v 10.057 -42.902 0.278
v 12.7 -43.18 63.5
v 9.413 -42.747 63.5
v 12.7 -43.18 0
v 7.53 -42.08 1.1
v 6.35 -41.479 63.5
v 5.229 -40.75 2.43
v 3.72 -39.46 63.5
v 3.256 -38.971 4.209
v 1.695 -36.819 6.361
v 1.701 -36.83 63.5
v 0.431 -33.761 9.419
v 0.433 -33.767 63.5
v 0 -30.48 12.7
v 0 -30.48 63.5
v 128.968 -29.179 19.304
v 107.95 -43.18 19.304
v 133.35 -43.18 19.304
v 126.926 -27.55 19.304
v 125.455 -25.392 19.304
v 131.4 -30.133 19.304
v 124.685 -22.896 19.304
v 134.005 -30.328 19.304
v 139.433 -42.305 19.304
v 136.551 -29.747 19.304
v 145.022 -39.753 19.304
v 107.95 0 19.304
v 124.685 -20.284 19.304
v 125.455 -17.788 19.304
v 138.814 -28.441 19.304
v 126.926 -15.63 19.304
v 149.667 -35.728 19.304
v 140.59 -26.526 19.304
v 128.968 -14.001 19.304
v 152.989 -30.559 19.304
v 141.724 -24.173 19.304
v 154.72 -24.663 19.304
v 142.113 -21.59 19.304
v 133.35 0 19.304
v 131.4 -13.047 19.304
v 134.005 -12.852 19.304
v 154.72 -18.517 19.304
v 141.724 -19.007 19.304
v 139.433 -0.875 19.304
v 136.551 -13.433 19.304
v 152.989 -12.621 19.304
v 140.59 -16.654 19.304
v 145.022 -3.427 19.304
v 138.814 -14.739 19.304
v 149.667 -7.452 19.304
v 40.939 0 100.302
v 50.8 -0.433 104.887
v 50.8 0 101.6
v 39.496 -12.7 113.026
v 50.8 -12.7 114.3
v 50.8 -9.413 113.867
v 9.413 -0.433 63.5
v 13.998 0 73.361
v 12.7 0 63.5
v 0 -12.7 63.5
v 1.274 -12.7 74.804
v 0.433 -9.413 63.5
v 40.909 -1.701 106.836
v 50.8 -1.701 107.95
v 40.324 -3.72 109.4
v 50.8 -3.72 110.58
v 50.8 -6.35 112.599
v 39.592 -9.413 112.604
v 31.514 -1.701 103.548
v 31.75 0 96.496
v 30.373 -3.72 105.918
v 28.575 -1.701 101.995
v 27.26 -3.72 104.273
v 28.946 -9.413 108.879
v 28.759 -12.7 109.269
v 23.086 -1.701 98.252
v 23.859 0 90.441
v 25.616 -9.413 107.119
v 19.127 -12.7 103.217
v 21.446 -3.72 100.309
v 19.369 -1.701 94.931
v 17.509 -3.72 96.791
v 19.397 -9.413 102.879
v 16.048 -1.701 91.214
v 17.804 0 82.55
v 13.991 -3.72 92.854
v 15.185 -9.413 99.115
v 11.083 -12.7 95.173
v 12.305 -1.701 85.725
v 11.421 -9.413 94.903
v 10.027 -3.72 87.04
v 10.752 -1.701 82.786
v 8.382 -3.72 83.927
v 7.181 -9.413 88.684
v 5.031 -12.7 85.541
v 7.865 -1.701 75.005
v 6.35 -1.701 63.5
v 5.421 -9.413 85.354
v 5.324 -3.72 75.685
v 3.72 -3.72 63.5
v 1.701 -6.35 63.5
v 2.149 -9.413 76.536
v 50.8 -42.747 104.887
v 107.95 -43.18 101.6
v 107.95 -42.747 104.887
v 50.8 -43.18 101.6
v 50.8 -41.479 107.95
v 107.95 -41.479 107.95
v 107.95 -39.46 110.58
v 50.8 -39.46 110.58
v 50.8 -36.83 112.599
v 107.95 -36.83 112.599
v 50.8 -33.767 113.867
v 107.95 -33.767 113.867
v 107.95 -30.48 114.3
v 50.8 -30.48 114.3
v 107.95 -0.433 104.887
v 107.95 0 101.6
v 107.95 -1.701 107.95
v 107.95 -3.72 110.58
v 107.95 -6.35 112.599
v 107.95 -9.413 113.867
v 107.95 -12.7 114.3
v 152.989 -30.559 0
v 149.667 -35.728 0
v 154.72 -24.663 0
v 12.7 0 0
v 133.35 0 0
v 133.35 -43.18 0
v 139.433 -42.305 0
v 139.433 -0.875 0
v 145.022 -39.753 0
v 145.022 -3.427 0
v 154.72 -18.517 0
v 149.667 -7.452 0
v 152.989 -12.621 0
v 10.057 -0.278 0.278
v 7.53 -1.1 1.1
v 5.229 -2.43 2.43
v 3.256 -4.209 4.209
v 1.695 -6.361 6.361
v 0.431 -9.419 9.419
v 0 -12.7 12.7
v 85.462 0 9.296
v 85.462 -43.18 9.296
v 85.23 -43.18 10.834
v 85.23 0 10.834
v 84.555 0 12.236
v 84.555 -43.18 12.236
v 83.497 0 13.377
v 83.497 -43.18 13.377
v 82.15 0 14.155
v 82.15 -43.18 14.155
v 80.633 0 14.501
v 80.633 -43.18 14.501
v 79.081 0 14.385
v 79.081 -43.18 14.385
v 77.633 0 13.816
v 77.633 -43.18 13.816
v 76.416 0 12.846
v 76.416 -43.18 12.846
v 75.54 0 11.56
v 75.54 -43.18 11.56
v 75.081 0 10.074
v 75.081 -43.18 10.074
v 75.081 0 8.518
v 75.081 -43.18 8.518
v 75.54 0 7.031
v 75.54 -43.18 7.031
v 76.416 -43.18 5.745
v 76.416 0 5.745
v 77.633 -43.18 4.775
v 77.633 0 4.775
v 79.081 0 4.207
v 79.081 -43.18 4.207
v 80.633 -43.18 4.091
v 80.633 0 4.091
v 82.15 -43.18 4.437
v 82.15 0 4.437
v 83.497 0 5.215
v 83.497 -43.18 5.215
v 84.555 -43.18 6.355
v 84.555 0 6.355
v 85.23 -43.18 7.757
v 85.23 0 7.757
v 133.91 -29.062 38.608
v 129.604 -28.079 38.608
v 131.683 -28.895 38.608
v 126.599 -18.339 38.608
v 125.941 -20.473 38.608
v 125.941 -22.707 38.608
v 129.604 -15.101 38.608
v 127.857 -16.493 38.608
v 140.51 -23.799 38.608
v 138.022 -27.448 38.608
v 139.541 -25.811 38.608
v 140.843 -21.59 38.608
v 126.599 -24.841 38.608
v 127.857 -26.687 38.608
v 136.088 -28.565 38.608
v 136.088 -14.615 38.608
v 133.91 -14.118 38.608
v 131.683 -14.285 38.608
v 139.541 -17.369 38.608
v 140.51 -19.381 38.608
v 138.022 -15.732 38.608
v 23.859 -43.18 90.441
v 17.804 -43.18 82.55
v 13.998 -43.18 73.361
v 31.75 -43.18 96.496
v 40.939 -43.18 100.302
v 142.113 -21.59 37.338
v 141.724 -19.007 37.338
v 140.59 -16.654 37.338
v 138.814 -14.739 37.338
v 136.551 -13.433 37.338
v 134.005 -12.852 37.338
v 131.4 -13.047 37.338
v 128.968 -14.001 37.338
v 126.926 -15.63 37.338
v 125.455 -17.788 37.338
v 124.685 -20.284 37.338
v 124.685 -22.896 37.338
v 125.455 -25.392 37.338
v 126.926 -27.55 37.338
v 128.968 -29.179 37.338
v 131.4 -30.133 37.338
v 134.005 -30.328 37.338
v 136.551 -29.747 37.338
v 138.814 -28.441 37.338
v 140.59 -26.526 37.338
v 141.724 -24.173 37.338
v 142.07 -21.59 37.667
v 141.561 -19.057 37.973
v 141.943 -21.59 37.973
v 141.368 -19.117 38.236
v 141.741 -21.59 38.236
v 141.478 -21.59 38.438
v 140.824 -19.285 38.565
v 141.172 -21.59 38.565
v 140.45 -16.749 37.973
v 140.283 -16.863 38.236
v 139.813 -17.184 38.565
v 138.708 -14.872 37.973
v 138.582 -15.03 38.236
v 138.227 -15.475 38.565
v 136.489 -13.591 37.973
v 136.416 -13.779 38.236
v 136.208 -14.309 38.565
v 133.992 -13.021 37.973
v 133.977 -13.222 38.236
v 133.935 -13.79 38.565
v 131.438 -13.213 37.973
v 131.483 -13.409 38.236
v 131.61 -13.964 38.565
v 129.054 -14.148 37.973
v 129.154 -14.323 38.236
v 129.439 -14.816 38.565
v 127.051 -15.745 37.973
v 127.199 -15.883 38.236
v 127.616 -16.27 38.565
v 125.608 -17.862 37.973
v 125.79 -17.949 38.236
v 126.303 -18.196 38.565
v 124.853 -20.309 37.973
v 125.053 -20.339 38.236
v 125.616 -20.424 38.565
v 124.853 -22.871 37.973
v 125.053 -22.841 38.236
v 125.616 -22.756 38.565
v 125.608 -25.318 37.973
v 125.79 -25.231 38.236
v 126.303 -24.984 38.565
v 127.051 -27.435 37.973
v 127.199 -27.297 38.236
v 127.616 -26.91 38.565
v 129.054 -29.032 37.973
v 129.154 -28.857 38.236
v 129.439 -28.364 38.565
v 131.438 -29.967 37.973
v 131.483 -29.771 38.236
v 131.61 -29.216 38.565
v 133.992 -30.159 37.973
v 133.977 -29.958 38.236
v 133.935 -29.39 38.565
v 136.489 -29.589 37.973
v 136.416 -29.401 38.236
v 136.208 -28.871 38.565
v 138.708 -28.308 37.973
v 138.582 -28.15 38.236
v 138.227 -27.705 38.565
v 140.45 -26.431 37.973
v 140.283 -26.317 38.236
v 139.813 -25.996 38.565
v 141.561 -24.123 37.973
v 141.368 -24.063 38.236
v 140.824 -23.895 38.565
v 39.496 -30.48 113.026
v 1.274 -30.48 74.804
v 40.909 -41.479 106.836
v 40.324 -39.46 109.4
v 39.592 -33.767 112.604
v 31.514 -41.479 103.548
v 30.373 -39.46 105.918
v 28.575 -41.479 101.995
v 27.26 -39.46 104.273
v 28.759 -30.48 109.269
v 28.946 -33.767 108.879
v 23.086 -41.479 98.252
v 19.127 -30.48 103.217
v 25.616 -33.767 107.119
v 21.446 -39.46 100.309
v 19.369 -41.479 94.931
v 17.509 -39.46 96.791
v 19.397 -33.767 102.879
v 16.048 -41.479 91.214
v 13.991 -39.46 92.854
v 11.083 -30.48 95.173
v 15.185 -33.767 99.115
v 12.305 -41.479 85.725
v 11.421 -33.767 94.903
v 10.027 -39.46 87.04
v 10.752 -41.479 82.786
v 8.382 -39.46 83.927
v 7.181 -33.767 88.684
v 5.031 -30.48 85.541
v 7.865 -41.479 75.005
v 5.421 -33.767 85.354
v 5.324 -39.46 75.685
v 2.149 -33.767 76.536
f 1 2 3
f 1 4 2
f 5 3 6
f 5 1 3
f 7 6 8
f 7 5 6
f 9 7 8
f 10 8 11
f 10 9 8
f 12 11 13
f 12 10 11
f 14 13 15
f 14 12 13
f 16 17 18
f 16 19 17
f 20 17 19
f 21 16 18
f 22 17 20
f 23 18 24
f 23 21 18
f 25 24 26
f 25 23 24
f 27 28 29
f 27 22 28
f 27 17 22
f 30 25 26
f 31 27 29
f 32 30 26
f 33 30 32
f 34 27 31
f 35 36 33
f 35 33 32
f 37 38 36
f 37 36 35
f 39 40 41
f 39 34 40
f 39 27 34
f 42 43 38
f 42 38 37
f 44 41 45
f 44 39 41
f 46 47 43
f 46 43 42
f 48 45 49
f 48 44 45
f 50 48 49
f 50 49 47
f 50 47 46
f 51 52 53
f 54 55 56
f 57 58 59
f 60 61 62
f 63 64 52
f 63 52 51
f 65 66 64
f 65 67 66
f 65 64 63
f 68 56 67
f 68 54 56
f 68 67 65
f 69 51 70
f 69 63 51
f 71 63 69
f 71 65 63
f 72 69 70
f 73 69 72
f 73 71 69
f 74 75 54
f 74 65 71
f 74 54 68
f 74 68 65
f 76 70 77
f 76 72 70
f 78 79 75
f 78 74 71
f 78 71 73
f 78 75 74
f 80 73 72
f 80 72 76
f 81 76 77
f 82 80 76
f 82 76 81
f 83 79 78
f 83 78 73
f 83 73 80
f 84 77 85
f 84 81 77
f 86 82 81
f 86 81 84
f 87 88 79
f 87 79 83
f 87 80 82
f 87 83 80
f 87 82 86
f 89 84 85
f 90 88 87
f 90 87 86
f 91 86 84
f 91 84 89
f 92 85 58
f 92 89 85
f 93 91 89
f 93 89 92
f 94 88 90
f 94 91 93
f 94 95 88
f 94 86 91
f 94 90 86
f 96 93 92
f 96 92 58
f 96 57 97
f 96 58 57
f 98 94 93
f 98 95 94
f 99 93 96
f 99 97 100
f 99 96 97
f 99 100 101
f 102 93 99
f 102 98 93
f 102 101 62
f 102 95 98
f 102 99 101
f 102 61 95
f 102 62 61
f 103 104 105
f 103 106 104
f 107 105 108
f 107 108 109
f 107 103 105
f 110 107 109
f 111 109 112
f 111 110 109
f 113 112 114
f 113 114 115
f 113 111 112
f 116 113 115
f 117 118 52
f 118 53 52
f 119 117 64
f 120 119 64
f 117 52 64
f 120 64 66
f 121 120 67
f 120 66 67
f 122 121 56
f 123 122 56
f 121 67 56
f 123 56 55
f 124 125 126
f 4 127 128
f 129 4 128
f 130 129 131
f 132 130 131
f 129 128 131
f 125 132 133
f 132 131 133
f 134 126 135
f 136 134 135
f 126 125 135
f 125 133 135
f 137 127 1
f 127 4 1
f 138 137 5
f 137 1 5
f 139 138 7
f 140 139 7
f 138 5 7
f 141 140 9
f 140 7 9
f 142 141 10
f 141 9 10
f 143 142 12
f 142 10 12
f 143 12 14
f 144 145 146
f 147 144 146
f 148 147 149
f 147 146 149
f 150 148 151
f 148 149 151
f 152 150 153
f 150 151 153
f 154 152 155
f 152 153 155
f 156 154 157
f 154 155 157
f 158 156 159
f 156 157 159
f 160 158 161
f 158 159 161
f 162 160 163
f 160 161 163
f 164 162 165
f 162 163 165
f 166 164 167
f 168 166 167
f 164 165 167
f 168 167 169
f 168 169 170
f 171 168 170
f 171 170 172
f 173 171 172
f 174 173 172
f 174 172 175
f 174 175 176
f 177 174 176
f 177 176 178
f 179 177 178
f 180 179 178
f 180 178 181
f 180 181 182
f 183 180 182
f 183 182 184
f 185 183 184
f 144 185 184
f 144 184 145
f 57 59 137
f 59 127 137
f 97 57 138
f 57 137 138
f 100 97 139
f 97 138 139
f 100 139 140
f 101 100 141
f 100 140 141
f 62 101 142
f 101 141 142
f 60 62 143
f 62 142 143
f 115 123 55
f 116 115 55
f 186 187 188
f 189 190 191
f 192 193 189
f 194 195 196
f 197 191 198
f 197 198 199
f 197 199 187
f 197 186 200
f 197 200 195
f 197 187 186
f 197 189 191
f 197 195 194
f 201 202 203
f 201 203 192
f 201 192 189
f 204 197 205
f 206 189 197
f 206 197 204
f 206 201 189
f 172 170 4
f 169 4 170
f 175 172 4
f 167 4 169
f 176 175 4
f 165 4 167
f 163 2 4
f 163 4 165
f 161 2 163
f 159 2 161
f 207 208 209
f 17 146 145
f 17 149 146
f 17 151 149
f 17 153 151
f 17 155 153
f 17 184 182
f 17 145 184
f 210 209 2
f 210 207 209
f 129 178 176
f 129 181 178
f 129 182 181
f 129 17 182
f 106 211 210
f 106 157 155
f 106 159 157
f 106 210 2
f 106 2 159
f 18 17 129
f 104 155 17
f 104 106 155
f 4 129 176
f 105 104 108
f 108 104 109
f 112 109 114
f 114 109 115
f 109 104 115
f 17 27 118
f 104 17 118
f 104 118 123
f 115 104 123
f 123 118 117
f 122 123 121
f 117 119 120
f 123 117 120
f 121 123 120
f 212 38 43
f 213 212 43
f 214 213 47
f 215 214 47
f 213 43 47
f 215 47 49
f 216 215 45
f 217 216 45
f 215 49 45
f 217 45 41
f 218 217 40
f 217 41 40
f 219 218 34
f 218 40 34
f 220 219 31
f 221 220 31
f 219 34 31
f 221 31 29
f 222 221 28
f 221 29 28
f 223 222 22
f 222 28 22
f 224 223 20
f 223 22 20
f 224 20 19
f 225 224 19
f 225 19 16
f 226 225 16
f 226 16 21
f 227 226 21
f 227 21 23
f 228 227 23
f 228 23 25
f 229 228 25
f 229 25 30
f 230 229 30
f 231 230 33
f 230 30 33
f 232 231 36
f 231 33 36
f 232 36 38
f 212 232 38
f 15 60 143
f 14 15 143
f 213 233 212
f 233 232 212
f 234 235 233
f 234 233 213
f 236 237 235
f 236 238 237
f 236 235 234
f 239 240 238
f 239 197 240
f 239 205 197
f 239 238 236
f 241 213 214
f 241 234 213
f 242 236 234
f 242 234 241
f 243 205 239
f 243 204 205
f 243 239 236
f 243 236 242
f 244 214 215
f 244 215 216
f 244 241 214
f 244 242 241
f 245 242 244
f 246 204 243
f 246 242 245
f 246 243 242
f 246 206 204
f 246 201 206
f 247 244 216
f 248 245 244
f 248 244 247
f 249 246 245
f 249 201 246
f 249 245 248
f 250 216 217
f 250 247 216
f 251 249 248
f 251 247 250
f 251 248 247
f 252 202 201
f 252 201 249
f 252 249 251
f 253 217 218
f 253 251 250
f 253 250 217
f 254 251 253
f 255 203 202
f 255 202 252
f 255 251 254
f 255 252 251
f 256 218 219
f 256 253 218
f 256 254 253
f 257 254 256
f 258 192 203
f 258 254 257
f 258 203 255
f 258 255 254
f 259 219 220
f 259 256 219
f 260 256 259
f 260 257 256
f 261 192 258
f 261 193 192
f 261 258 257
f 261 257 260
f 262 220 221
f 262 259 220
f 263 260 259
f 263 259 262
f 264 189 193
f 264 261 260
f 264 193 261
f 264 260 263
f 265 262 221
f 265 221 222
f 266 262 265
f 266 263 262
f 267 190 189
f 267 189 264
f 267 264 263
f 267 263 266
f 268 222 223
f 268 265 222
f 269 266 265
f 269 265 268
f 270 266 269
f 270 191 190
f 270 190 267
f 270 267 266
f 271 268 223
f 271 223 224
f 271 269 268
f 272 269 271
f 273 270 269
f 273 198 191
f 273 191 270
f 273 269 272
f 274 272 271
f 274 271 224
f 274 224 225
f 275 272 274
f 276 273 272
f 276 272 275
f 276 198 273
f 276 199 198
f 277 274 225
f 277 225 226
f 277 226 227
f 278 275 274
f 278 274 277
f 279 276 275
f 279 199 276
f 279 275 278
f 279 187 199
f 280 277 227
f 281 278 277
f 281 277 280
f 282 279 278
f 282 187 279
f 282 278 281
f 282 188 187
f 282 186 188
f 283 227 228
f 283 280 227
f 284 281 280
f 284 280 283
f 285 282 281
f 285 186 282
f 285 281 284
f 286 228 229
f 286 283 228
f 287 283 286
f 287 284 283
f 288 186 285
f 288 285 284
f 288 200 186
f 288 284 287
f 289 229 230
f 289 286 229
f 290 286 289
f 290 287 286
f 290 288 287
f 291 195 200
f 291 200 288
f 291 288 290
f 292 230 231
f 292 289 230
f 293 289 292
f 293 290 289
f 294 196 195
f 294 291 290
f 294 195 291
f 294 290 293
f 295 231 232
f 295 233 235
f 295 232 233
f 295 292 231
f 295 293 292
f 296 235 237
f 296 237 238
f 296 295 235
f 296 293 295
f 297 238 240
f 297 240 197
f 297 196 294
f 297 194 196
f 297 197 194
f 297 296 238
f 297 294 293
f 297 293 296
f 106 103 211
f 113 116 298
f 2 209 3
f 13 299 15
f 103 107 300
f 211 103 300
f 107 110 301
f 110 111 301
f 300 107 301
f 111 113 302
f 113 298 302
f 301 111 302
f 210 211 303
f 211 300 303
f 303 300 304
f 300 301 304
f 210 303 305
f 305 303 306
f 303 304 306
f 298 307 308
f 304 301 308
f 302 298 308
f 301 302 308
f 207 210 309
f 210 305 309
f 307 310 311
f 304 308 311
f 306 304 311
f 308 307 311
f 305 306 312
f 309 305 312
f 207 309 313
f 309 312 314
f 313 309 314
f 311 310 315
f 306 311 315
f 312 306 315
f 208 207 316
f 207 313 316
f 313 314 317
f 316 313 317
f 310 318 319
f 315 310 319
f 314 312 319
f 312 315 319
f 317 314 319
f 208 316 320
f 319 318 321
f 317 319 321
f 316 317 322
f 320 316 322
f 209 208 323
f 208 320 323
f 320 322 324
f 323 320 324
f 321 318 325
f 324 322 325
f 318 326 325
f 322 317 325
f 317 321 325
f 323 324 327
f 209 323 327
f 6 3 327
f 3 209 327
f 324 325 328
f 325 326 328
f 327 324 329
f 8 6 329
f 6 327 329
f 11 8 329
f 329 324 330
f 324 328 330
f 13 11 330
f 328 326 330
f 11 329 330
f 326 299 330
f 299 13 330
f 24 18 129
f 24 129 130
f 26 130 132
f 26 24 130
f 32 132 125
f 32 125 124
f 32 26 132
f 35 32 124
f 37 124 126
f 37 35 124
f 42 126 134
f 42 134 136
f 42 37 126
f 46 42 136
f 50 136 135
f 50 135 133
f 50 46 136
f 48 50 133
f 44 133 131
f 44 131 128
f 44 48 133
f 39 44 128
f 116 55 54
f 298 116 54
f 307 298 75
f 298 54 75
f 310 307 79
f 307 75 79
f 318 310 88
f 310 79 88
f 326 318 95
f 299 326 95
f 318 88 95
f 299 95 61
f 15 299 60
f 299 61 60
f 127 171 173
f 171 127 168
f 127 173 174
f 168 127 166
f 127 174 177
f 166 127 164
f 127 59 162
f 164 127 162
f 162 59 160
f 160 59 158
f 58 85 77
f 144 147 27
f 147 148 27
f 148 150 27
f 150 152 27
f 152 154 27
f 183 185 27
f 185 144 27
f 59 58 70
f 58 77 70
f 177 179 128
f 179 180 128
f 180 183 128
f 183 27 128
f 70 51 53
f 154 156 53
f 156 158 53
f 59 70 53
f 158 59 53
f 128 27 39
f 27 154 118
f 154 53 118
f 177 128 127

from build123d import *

# Parameters (mm, degrees)
F0_W     = 25.4
F0_H     = 19.304
F1_DEPTH = 43.18
F3_DEPTH = 19.304
F4_R     = 8.763
F5_DEPTH = 19.304
F6_R     = 1.27
F7_R     = 12.7
F8_R     = 5.2197
F9_DEPTH = 43.181


with BuildPart() as f1:
    # F0 (on Front) → F1 (new body)
    with BuildSketch(Plane.XZ):
        with BuildLine():
            Line((0, 63.5), (0, 0))
            Line((0, 0), (107.95, 0))
            Line((107.95, 0), (107.95, 19.304))
            Line((107.95, 19.304), (107.95, 114.3))
            Line((107.95, 114.3), (50.8, 114.3))
            ThreePointArc((50.8, 114.3), (14.878976, 99.421024), (0, 63.5))
        make_face()
        with Locations((120.65, 9.652)):
            Rectangle(F0_W, F0_H)
    extrude(amount=F1_DEPTH)

    # F2 (on face) → F3 (join)
    with BuildSketch(Plane.XY.offset(19.304)):
        with BuildLine():
            Line((133.35, 0), (133.35, -43.18))
            ThreePointArc((133.35, -43.18), (154.94, -21.59), (133.35, 0))
        make_face()
    extrude(amount=-F3_DEPTH)

    # F4 (on face) → F5 (join)
    with BuildSketch(Plane.XY.offset(19.304)):
        with Locations((133.35, -21.59)):
            Circle(F4_R)
    extrude(amount=F5_DEPTH)

    # F6
    f6_edges = [f1.edges().sort_by_distance(p)[0] for p in [
        (124.587, -21.59, 38.608),
    ]]
    fillet(f6_edges, radius=F6_R)

    # F7
    f7_edges = [f1.edges().sort_by_distance(p)[0] for p in [
        (50.8, -21.59, 114.3),
        (0, -21.59, 63.5),
        (14.878976, 0, 99.421024),
        (14.878976, -43.18, 99.421024),
        (0, -21.59, 0),
    ]]
    fillet(f7_edges, radius=F7_R)

    # F8 (on face) → F9 (cut, through all)
    with BuildSketch(Plane.XZ.offset(43.18)):
        with Locations((80.242619, 9.295693)):
            Circle(F8_R)
    extrude(amount=-F9_DEPTH, mode=Mode.SUBTRACT)


solid = f1.part
